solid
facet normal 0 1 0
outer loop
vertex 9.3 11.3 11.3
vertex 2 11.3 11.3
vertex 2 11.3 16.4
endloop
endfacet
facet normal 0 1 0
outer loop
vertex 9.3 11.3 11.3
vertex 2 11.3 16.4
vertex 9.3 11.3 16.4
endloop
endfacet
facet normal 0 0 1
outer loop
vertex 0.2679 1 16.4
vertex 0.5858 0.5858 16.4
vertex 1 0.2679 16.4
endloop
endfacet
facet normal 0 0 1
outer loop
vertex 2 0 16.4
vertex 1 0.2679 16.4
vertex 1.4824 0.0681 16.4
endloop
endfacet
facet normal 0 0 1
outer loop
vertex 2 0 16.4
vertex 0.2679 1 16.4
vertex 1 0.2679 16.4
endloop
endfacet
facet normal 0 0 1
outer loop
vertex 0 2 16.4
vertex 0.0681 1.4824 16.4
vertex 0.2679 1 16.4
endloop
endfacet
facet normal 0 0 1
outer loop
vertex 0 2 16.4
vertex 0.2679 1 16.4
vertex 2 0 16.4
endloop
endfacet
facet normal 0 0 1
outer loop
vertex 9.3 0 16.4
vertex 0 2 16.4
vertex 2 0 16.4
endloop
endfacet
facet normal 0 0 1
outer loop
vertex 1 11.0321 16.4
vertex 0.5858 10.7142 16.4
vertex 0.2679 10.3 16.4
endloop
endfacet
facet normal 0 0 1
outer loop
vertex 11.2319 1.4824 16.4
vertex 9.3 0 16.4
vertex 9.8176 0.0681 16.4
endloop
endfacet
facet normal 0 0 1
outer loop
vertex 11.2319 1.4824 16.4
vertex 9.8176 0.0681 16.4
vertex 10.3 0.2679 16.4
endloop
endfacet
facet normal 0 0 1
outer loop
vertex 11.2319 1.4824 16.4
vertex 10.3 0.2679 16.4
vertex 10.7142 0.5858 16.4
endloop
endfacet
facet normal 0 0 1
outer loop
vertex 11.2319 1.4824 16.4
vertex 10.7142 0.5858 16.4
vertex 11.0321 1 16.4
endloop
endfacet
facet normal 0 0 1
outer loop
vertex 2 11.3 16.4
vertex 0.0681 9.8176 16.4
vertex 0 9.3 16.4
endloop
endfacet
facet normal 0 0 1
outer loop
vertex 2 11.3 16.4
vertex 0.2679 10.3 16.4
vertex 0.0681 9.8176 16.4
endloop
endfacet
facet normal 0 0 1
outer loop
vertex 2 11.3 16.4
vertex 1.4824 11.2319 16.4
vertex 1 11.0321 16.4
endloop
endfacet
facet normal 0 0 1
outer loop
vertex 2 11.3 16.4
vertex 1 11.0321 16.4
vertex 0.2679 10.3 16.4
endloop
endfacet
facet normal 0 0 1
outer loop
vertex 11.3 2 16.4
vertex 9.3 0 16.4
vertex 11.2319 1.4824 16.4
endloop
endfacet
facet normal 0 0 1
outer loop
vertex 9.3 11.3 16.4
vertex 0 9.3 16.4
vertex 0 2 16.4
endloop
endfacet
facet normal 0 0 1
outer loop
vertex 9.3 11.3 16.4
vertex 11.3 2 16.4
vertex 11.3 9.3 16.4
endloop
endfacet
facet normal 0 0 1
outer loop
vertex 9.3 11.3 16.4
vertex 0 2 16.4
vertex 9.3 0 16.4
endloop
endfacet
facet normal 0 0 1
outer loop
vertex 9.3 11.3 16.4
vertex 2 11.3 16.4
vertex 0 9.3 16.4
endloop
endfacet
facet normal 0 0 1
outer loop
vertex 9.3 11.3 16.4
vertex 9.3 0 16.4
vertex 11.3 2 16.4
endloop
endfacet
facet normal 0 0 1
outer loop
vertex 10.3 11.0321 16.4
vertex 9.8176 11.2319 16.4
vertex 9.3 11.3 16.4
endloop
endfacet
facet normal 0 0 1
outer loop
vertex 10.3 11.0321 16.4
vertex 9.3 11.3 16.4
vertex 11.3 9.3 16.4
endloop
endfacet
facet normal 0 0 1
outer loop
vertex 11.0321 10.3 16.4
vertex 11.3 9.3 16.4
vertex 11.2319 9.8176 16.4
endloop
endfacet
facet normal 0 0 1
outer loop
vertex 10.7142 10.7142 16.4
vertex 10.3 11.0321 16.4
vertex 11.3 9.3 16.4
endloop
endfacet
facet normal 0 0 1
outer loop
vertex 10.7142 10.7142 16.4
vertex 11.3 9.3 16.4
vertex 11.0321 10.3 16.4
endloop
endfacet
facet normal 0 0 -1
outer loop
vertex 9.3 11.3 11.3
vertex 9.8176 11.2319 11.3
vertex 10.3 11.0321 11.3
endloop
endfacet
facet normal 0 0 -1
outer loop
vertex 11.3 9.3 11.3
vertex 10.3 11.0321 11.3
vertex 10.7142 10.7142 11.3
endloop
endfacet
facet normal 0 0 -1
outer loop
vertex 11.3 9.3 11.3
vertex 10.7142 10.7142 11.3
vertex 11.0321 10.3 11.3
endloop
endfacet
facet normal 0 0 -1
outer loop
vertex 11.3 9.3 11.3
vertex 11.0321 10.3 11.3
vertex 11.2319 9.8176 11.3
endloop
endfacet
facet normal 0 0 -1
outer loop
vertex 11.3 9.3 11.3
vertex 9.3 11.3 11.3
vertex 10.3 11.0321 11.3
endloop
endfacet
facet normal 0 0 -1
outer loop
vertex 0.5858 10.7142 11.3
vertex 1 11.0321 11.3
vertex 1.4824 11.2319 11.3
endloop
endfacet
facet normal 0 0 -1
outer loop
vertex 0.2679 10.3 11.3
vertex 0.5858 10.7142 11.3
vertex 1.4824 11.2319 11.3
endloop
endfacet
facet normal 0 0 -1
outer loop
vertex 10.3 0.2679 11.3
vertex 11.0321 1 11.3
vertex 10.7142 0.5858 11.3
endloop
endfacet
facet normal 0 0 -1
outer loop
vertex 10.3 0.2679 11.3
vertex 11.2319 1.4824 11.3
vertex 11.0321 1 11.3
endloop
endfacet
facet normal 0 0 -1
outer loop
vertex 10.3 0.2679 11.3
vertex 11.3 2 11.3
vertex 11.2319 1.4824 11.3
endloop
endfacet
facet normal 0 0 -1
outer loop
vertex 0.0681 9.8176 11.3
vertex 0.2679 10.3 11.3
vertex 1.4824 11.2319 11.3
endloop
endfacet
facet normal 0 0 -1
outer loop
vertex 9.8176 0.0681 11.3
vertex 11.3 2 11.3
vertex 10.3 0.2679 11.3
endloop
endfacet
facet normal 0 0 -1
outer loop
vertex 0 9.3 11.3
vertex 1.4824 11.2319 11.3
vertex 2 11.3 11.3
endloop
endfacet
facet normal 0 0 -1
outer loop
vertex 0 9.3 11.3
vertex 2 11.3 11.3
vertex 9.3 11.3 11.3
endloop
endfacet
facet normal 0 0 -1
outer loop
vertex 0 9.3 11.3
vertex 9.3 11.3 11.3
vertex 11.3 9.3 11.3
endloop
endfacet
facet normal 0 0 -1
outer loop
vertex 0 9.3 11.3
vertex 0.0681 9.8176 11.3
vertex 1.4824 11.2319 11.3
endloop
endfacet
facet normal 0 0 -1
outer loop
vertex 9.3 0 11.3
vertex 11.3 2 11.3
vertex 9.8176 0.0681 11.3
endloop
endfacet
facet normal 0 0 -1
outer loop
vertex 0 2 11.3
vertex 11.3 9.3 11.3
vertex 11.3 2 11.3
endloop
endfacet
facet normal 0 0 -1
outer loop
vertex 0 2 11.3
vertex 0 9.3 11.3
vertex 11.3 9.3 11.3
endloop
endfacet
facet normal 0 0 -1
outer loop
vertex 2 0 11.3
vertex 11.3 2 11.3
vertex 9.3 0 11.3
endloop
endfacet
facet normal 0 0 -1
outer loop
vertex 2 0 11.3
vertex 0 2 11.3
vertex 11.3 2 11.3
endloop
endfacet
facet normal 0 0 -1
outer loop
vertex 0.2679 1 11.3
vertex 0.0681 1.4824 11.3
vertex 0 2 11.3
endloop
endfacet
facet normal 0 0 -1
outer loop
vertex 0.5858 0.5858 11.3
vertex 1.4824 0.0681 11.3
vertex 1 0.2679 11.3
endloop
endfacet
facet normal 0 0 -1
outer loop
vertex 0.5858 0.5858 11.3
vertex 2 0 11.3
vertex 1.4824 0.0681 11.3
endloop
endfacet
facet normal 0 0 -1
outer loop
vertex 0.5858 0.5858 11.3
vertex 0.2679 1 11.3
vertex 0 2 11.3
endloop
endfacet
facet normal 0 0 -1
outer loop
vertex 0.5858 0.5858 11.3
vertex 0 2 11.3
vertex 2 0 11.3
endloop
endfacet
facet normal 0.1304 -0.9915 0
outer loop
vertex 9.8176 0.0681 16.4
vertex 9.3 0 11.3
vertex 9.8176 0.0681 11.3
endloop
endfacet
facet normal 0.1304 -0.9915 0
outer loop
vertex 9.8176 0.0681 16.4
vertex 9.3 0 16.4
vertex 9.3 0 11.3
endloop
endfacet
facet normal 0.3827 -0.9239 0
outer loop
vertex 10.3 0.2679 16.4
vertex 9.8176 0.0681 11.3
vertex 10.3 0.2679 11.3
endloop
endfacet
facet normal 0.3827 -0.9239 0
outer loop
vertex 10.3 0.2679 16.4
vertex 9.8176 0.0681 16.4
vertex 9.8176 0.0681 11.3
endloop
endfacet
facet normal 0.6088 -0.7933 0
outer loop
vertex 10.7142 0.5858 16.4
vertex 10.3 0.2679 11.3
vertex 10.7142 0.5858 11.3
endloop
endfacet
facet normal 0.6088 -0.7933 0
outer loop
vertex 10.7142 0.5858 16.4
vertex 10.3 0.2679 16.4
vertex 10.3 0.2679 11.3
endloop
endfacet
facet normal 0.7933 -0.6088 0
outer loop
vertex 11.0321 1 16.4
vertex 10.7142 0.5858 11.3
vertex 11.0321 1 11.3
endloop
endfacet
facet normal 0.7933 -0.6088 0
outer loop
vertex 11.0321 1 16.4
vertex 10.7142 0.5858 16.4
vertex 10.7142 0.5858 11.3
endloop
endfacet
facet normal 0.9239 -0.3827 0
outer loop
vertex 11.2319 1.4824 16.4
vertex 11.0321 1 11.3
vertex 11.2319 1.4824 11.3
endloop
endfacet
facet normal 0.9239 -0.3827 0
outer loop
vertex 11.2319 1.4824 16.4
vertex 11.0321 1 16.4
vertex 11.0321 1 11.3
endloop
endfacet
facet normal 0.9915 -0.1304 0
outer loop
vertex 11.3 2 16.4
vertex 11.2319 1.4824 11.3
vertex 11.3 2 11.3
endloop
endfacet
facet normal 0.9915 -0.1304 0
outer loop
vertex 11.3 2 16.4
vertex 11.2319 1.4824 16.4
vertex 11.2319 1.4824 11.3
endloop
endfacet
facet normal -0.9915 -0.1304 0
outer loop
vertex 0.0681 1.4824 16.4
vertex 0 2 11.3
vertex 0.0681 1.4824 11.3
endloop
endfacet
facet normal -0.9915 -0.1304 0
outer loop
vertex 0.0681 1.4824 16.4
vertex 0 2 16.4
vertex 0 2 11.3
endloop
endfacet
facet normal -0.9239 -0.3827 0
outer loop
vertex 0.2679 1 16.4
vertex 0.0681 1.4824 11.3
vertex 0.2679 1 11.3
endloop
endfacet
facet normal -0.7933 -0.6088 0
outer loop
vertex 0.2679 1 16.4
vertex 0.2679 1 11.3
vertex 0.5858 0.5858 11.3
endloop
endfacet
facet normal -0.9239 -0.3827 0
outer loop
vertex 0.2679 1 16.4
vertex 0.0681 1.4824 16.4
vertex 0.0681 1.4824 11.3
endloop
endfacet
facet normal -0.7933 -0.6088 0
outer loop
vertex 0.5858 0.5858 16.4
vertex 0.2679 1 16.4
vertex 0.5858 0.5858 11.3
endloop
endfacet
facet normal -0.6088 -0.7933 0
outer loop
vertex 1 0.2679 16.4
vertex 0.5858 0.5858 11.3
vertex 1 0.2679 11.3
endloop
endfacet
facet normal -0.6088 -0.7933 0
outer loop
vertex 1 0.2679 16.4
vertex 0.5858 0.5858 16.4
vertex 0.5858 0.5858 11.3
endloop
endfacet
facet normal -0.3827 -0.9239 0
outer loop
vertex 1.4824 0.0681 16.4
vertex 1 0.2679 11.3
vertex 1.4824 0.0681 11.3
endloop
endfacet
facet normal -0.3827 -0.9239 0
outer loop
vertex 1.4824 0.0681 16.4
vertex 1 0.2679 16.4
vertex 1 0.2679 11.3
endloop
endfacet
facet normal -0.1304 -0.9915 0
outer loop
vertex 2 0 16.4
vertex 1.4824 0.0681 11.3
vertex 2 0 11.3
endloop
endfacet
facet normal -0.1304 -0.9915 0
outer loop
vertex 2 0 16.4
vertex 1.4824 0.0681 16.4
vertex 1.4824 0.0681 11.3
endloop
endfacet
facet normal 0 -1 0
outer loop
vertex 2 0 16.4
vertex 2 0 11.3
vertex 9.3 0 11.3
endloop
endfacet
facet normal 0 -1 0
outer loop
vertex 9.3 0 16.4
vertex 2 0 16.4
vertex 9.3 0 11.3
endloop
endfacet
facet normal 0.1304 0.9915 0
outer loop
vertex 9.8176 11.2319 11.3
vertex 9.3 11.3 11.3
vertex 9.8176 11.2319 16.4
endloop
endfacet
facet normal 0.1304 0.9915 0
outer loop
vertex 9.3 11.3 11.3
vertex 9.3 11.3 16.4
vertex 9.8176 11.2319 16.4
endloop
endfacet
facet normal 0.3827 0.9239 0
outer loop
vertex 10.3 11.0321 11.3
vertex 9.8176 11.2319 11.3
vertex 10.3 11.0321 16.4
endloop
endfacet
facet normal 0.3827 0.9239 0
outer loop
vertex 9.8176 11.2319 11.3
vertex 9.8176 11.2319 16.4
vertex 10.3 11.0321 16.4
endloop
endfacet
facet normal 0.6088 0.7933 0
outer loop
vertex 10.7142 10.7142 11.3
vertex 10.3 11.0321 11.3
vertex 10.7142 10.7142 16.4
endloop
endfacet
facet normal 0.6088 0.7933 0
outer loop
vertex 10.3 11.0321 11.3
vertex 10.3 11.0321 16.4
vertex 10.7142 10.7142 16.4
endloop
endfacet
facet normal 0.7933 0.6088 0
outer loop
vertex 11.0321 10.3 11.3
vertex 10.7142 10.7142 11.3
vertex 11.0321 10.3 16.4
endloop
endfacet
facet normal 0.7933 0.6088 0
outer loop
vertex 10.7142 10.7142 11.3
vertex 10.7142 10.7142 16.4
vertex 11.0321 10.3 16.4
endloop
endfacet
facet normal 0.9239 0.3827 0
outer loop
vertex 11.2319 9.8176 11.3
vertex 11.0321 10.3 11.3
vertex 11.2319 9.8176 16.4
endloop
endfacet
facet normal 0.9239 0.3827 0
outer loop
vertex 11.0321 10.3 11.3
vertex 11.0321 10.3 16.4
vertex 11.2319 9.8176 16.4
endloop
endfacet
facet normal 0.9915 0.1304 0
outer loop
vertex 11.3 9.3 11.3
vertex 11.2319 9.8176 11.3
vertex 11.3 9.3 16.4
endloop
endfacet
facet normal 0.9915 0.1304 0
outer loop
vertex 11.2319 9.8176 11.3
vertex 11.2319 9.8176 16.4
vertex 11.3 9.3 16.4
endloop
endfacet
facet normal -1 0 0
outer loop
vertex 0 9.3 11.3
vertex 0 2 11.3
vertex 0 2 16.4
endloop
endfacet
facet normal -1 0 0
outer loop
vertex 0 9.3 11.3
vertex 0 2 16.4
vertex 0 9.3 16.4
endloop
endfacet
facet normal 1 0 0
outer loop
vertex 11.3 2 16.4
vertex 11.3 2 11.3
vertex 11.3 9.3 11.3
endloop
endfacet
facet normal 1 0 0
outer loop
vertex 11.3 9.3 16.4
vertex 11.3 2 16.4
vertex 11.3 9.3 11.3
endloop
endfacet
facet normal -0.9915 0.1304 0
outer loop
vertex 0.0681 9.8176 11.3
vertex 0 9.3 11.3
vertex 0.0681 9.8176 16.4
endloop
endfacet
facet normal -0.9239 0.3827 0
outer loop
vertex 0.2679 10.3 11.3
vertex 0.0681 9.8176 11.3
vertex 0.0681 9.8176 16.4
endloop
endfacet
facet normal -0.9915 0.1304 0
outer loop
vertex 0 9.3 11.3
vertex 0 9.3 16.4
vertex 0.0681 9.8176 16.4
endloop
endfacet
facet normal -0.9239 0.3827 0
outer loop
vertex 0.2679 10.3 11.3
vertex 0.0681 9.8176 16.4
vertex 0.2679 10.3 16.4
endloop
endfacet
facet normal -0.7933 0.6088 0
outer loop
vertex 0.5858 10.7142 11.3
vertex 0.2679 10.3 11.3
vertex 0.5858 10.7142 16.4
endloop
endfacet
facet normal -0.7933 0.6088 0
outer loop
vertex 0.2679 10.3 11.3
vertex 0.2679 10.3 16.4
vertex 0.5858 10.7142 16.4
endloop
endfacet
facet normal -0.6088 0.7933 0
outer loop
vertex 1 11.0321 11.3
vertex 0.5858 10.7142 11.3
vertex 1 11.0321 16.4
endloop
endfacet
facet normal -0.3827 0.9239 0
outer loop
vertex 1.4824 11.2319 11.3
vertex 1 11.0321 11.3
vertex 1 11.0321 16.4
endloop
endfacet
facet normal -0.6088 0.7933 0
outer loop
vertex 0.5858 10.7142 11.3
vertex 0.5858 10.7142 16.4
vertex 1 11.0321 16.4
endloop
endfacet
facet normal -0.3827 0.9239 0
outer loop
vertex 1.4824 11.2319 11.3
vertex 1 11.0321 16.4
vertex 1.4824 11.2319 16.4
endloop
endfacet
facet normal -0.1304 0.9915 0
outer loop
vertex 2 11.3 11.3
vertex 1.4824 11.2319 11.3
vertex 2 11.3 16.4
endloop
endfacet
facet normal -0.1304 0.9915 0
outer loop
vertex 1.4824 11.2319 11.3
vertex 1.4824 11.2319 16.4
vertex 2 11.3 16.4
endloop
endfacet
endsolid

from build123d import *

# Parameters (mm, degrees)
F0_W     = 11.3
F0_H     = 11.3
F1_DEPTH = 16.4
F2_W     = 11.3
F2_H     = 11.3
F3_DEPTH = 25
F4_R     = 2


with BuildPart() as f1:
    # F0 (on Top) → F1 (new body)
    with BuildSketch(Plane.XY):
        with Locations((5.65, 5.65)):
            Rectangle(F0_W, F0_H)
    extrude(amount=F1_DEPTH)

    # F2 (on face) → F3 (cut)
    with BuildSketch(Plane(origin=(0, 0, 0), x_dir=(0, -1, 0), z_dir=(-1, 0, 0))):
        with Locations((-5.65, 5.65)):
            Rectangle(F2_W, F2_H)
    extrude(amount=-F3_DEPTH, mode=Mode.SUBTRACT)

    # F4
    f4_edges = [f1.edges().sort_by_distance(p)[0] for p in [
        (0, 0, 13.85),
        (11.3, 0, 13.85),
        (0, 11.3, 13.85),
        (11.3, 11.3, 13.85),
    ]]
    fillet(f4_edges, radius=F4_R)


solid = f1.part
